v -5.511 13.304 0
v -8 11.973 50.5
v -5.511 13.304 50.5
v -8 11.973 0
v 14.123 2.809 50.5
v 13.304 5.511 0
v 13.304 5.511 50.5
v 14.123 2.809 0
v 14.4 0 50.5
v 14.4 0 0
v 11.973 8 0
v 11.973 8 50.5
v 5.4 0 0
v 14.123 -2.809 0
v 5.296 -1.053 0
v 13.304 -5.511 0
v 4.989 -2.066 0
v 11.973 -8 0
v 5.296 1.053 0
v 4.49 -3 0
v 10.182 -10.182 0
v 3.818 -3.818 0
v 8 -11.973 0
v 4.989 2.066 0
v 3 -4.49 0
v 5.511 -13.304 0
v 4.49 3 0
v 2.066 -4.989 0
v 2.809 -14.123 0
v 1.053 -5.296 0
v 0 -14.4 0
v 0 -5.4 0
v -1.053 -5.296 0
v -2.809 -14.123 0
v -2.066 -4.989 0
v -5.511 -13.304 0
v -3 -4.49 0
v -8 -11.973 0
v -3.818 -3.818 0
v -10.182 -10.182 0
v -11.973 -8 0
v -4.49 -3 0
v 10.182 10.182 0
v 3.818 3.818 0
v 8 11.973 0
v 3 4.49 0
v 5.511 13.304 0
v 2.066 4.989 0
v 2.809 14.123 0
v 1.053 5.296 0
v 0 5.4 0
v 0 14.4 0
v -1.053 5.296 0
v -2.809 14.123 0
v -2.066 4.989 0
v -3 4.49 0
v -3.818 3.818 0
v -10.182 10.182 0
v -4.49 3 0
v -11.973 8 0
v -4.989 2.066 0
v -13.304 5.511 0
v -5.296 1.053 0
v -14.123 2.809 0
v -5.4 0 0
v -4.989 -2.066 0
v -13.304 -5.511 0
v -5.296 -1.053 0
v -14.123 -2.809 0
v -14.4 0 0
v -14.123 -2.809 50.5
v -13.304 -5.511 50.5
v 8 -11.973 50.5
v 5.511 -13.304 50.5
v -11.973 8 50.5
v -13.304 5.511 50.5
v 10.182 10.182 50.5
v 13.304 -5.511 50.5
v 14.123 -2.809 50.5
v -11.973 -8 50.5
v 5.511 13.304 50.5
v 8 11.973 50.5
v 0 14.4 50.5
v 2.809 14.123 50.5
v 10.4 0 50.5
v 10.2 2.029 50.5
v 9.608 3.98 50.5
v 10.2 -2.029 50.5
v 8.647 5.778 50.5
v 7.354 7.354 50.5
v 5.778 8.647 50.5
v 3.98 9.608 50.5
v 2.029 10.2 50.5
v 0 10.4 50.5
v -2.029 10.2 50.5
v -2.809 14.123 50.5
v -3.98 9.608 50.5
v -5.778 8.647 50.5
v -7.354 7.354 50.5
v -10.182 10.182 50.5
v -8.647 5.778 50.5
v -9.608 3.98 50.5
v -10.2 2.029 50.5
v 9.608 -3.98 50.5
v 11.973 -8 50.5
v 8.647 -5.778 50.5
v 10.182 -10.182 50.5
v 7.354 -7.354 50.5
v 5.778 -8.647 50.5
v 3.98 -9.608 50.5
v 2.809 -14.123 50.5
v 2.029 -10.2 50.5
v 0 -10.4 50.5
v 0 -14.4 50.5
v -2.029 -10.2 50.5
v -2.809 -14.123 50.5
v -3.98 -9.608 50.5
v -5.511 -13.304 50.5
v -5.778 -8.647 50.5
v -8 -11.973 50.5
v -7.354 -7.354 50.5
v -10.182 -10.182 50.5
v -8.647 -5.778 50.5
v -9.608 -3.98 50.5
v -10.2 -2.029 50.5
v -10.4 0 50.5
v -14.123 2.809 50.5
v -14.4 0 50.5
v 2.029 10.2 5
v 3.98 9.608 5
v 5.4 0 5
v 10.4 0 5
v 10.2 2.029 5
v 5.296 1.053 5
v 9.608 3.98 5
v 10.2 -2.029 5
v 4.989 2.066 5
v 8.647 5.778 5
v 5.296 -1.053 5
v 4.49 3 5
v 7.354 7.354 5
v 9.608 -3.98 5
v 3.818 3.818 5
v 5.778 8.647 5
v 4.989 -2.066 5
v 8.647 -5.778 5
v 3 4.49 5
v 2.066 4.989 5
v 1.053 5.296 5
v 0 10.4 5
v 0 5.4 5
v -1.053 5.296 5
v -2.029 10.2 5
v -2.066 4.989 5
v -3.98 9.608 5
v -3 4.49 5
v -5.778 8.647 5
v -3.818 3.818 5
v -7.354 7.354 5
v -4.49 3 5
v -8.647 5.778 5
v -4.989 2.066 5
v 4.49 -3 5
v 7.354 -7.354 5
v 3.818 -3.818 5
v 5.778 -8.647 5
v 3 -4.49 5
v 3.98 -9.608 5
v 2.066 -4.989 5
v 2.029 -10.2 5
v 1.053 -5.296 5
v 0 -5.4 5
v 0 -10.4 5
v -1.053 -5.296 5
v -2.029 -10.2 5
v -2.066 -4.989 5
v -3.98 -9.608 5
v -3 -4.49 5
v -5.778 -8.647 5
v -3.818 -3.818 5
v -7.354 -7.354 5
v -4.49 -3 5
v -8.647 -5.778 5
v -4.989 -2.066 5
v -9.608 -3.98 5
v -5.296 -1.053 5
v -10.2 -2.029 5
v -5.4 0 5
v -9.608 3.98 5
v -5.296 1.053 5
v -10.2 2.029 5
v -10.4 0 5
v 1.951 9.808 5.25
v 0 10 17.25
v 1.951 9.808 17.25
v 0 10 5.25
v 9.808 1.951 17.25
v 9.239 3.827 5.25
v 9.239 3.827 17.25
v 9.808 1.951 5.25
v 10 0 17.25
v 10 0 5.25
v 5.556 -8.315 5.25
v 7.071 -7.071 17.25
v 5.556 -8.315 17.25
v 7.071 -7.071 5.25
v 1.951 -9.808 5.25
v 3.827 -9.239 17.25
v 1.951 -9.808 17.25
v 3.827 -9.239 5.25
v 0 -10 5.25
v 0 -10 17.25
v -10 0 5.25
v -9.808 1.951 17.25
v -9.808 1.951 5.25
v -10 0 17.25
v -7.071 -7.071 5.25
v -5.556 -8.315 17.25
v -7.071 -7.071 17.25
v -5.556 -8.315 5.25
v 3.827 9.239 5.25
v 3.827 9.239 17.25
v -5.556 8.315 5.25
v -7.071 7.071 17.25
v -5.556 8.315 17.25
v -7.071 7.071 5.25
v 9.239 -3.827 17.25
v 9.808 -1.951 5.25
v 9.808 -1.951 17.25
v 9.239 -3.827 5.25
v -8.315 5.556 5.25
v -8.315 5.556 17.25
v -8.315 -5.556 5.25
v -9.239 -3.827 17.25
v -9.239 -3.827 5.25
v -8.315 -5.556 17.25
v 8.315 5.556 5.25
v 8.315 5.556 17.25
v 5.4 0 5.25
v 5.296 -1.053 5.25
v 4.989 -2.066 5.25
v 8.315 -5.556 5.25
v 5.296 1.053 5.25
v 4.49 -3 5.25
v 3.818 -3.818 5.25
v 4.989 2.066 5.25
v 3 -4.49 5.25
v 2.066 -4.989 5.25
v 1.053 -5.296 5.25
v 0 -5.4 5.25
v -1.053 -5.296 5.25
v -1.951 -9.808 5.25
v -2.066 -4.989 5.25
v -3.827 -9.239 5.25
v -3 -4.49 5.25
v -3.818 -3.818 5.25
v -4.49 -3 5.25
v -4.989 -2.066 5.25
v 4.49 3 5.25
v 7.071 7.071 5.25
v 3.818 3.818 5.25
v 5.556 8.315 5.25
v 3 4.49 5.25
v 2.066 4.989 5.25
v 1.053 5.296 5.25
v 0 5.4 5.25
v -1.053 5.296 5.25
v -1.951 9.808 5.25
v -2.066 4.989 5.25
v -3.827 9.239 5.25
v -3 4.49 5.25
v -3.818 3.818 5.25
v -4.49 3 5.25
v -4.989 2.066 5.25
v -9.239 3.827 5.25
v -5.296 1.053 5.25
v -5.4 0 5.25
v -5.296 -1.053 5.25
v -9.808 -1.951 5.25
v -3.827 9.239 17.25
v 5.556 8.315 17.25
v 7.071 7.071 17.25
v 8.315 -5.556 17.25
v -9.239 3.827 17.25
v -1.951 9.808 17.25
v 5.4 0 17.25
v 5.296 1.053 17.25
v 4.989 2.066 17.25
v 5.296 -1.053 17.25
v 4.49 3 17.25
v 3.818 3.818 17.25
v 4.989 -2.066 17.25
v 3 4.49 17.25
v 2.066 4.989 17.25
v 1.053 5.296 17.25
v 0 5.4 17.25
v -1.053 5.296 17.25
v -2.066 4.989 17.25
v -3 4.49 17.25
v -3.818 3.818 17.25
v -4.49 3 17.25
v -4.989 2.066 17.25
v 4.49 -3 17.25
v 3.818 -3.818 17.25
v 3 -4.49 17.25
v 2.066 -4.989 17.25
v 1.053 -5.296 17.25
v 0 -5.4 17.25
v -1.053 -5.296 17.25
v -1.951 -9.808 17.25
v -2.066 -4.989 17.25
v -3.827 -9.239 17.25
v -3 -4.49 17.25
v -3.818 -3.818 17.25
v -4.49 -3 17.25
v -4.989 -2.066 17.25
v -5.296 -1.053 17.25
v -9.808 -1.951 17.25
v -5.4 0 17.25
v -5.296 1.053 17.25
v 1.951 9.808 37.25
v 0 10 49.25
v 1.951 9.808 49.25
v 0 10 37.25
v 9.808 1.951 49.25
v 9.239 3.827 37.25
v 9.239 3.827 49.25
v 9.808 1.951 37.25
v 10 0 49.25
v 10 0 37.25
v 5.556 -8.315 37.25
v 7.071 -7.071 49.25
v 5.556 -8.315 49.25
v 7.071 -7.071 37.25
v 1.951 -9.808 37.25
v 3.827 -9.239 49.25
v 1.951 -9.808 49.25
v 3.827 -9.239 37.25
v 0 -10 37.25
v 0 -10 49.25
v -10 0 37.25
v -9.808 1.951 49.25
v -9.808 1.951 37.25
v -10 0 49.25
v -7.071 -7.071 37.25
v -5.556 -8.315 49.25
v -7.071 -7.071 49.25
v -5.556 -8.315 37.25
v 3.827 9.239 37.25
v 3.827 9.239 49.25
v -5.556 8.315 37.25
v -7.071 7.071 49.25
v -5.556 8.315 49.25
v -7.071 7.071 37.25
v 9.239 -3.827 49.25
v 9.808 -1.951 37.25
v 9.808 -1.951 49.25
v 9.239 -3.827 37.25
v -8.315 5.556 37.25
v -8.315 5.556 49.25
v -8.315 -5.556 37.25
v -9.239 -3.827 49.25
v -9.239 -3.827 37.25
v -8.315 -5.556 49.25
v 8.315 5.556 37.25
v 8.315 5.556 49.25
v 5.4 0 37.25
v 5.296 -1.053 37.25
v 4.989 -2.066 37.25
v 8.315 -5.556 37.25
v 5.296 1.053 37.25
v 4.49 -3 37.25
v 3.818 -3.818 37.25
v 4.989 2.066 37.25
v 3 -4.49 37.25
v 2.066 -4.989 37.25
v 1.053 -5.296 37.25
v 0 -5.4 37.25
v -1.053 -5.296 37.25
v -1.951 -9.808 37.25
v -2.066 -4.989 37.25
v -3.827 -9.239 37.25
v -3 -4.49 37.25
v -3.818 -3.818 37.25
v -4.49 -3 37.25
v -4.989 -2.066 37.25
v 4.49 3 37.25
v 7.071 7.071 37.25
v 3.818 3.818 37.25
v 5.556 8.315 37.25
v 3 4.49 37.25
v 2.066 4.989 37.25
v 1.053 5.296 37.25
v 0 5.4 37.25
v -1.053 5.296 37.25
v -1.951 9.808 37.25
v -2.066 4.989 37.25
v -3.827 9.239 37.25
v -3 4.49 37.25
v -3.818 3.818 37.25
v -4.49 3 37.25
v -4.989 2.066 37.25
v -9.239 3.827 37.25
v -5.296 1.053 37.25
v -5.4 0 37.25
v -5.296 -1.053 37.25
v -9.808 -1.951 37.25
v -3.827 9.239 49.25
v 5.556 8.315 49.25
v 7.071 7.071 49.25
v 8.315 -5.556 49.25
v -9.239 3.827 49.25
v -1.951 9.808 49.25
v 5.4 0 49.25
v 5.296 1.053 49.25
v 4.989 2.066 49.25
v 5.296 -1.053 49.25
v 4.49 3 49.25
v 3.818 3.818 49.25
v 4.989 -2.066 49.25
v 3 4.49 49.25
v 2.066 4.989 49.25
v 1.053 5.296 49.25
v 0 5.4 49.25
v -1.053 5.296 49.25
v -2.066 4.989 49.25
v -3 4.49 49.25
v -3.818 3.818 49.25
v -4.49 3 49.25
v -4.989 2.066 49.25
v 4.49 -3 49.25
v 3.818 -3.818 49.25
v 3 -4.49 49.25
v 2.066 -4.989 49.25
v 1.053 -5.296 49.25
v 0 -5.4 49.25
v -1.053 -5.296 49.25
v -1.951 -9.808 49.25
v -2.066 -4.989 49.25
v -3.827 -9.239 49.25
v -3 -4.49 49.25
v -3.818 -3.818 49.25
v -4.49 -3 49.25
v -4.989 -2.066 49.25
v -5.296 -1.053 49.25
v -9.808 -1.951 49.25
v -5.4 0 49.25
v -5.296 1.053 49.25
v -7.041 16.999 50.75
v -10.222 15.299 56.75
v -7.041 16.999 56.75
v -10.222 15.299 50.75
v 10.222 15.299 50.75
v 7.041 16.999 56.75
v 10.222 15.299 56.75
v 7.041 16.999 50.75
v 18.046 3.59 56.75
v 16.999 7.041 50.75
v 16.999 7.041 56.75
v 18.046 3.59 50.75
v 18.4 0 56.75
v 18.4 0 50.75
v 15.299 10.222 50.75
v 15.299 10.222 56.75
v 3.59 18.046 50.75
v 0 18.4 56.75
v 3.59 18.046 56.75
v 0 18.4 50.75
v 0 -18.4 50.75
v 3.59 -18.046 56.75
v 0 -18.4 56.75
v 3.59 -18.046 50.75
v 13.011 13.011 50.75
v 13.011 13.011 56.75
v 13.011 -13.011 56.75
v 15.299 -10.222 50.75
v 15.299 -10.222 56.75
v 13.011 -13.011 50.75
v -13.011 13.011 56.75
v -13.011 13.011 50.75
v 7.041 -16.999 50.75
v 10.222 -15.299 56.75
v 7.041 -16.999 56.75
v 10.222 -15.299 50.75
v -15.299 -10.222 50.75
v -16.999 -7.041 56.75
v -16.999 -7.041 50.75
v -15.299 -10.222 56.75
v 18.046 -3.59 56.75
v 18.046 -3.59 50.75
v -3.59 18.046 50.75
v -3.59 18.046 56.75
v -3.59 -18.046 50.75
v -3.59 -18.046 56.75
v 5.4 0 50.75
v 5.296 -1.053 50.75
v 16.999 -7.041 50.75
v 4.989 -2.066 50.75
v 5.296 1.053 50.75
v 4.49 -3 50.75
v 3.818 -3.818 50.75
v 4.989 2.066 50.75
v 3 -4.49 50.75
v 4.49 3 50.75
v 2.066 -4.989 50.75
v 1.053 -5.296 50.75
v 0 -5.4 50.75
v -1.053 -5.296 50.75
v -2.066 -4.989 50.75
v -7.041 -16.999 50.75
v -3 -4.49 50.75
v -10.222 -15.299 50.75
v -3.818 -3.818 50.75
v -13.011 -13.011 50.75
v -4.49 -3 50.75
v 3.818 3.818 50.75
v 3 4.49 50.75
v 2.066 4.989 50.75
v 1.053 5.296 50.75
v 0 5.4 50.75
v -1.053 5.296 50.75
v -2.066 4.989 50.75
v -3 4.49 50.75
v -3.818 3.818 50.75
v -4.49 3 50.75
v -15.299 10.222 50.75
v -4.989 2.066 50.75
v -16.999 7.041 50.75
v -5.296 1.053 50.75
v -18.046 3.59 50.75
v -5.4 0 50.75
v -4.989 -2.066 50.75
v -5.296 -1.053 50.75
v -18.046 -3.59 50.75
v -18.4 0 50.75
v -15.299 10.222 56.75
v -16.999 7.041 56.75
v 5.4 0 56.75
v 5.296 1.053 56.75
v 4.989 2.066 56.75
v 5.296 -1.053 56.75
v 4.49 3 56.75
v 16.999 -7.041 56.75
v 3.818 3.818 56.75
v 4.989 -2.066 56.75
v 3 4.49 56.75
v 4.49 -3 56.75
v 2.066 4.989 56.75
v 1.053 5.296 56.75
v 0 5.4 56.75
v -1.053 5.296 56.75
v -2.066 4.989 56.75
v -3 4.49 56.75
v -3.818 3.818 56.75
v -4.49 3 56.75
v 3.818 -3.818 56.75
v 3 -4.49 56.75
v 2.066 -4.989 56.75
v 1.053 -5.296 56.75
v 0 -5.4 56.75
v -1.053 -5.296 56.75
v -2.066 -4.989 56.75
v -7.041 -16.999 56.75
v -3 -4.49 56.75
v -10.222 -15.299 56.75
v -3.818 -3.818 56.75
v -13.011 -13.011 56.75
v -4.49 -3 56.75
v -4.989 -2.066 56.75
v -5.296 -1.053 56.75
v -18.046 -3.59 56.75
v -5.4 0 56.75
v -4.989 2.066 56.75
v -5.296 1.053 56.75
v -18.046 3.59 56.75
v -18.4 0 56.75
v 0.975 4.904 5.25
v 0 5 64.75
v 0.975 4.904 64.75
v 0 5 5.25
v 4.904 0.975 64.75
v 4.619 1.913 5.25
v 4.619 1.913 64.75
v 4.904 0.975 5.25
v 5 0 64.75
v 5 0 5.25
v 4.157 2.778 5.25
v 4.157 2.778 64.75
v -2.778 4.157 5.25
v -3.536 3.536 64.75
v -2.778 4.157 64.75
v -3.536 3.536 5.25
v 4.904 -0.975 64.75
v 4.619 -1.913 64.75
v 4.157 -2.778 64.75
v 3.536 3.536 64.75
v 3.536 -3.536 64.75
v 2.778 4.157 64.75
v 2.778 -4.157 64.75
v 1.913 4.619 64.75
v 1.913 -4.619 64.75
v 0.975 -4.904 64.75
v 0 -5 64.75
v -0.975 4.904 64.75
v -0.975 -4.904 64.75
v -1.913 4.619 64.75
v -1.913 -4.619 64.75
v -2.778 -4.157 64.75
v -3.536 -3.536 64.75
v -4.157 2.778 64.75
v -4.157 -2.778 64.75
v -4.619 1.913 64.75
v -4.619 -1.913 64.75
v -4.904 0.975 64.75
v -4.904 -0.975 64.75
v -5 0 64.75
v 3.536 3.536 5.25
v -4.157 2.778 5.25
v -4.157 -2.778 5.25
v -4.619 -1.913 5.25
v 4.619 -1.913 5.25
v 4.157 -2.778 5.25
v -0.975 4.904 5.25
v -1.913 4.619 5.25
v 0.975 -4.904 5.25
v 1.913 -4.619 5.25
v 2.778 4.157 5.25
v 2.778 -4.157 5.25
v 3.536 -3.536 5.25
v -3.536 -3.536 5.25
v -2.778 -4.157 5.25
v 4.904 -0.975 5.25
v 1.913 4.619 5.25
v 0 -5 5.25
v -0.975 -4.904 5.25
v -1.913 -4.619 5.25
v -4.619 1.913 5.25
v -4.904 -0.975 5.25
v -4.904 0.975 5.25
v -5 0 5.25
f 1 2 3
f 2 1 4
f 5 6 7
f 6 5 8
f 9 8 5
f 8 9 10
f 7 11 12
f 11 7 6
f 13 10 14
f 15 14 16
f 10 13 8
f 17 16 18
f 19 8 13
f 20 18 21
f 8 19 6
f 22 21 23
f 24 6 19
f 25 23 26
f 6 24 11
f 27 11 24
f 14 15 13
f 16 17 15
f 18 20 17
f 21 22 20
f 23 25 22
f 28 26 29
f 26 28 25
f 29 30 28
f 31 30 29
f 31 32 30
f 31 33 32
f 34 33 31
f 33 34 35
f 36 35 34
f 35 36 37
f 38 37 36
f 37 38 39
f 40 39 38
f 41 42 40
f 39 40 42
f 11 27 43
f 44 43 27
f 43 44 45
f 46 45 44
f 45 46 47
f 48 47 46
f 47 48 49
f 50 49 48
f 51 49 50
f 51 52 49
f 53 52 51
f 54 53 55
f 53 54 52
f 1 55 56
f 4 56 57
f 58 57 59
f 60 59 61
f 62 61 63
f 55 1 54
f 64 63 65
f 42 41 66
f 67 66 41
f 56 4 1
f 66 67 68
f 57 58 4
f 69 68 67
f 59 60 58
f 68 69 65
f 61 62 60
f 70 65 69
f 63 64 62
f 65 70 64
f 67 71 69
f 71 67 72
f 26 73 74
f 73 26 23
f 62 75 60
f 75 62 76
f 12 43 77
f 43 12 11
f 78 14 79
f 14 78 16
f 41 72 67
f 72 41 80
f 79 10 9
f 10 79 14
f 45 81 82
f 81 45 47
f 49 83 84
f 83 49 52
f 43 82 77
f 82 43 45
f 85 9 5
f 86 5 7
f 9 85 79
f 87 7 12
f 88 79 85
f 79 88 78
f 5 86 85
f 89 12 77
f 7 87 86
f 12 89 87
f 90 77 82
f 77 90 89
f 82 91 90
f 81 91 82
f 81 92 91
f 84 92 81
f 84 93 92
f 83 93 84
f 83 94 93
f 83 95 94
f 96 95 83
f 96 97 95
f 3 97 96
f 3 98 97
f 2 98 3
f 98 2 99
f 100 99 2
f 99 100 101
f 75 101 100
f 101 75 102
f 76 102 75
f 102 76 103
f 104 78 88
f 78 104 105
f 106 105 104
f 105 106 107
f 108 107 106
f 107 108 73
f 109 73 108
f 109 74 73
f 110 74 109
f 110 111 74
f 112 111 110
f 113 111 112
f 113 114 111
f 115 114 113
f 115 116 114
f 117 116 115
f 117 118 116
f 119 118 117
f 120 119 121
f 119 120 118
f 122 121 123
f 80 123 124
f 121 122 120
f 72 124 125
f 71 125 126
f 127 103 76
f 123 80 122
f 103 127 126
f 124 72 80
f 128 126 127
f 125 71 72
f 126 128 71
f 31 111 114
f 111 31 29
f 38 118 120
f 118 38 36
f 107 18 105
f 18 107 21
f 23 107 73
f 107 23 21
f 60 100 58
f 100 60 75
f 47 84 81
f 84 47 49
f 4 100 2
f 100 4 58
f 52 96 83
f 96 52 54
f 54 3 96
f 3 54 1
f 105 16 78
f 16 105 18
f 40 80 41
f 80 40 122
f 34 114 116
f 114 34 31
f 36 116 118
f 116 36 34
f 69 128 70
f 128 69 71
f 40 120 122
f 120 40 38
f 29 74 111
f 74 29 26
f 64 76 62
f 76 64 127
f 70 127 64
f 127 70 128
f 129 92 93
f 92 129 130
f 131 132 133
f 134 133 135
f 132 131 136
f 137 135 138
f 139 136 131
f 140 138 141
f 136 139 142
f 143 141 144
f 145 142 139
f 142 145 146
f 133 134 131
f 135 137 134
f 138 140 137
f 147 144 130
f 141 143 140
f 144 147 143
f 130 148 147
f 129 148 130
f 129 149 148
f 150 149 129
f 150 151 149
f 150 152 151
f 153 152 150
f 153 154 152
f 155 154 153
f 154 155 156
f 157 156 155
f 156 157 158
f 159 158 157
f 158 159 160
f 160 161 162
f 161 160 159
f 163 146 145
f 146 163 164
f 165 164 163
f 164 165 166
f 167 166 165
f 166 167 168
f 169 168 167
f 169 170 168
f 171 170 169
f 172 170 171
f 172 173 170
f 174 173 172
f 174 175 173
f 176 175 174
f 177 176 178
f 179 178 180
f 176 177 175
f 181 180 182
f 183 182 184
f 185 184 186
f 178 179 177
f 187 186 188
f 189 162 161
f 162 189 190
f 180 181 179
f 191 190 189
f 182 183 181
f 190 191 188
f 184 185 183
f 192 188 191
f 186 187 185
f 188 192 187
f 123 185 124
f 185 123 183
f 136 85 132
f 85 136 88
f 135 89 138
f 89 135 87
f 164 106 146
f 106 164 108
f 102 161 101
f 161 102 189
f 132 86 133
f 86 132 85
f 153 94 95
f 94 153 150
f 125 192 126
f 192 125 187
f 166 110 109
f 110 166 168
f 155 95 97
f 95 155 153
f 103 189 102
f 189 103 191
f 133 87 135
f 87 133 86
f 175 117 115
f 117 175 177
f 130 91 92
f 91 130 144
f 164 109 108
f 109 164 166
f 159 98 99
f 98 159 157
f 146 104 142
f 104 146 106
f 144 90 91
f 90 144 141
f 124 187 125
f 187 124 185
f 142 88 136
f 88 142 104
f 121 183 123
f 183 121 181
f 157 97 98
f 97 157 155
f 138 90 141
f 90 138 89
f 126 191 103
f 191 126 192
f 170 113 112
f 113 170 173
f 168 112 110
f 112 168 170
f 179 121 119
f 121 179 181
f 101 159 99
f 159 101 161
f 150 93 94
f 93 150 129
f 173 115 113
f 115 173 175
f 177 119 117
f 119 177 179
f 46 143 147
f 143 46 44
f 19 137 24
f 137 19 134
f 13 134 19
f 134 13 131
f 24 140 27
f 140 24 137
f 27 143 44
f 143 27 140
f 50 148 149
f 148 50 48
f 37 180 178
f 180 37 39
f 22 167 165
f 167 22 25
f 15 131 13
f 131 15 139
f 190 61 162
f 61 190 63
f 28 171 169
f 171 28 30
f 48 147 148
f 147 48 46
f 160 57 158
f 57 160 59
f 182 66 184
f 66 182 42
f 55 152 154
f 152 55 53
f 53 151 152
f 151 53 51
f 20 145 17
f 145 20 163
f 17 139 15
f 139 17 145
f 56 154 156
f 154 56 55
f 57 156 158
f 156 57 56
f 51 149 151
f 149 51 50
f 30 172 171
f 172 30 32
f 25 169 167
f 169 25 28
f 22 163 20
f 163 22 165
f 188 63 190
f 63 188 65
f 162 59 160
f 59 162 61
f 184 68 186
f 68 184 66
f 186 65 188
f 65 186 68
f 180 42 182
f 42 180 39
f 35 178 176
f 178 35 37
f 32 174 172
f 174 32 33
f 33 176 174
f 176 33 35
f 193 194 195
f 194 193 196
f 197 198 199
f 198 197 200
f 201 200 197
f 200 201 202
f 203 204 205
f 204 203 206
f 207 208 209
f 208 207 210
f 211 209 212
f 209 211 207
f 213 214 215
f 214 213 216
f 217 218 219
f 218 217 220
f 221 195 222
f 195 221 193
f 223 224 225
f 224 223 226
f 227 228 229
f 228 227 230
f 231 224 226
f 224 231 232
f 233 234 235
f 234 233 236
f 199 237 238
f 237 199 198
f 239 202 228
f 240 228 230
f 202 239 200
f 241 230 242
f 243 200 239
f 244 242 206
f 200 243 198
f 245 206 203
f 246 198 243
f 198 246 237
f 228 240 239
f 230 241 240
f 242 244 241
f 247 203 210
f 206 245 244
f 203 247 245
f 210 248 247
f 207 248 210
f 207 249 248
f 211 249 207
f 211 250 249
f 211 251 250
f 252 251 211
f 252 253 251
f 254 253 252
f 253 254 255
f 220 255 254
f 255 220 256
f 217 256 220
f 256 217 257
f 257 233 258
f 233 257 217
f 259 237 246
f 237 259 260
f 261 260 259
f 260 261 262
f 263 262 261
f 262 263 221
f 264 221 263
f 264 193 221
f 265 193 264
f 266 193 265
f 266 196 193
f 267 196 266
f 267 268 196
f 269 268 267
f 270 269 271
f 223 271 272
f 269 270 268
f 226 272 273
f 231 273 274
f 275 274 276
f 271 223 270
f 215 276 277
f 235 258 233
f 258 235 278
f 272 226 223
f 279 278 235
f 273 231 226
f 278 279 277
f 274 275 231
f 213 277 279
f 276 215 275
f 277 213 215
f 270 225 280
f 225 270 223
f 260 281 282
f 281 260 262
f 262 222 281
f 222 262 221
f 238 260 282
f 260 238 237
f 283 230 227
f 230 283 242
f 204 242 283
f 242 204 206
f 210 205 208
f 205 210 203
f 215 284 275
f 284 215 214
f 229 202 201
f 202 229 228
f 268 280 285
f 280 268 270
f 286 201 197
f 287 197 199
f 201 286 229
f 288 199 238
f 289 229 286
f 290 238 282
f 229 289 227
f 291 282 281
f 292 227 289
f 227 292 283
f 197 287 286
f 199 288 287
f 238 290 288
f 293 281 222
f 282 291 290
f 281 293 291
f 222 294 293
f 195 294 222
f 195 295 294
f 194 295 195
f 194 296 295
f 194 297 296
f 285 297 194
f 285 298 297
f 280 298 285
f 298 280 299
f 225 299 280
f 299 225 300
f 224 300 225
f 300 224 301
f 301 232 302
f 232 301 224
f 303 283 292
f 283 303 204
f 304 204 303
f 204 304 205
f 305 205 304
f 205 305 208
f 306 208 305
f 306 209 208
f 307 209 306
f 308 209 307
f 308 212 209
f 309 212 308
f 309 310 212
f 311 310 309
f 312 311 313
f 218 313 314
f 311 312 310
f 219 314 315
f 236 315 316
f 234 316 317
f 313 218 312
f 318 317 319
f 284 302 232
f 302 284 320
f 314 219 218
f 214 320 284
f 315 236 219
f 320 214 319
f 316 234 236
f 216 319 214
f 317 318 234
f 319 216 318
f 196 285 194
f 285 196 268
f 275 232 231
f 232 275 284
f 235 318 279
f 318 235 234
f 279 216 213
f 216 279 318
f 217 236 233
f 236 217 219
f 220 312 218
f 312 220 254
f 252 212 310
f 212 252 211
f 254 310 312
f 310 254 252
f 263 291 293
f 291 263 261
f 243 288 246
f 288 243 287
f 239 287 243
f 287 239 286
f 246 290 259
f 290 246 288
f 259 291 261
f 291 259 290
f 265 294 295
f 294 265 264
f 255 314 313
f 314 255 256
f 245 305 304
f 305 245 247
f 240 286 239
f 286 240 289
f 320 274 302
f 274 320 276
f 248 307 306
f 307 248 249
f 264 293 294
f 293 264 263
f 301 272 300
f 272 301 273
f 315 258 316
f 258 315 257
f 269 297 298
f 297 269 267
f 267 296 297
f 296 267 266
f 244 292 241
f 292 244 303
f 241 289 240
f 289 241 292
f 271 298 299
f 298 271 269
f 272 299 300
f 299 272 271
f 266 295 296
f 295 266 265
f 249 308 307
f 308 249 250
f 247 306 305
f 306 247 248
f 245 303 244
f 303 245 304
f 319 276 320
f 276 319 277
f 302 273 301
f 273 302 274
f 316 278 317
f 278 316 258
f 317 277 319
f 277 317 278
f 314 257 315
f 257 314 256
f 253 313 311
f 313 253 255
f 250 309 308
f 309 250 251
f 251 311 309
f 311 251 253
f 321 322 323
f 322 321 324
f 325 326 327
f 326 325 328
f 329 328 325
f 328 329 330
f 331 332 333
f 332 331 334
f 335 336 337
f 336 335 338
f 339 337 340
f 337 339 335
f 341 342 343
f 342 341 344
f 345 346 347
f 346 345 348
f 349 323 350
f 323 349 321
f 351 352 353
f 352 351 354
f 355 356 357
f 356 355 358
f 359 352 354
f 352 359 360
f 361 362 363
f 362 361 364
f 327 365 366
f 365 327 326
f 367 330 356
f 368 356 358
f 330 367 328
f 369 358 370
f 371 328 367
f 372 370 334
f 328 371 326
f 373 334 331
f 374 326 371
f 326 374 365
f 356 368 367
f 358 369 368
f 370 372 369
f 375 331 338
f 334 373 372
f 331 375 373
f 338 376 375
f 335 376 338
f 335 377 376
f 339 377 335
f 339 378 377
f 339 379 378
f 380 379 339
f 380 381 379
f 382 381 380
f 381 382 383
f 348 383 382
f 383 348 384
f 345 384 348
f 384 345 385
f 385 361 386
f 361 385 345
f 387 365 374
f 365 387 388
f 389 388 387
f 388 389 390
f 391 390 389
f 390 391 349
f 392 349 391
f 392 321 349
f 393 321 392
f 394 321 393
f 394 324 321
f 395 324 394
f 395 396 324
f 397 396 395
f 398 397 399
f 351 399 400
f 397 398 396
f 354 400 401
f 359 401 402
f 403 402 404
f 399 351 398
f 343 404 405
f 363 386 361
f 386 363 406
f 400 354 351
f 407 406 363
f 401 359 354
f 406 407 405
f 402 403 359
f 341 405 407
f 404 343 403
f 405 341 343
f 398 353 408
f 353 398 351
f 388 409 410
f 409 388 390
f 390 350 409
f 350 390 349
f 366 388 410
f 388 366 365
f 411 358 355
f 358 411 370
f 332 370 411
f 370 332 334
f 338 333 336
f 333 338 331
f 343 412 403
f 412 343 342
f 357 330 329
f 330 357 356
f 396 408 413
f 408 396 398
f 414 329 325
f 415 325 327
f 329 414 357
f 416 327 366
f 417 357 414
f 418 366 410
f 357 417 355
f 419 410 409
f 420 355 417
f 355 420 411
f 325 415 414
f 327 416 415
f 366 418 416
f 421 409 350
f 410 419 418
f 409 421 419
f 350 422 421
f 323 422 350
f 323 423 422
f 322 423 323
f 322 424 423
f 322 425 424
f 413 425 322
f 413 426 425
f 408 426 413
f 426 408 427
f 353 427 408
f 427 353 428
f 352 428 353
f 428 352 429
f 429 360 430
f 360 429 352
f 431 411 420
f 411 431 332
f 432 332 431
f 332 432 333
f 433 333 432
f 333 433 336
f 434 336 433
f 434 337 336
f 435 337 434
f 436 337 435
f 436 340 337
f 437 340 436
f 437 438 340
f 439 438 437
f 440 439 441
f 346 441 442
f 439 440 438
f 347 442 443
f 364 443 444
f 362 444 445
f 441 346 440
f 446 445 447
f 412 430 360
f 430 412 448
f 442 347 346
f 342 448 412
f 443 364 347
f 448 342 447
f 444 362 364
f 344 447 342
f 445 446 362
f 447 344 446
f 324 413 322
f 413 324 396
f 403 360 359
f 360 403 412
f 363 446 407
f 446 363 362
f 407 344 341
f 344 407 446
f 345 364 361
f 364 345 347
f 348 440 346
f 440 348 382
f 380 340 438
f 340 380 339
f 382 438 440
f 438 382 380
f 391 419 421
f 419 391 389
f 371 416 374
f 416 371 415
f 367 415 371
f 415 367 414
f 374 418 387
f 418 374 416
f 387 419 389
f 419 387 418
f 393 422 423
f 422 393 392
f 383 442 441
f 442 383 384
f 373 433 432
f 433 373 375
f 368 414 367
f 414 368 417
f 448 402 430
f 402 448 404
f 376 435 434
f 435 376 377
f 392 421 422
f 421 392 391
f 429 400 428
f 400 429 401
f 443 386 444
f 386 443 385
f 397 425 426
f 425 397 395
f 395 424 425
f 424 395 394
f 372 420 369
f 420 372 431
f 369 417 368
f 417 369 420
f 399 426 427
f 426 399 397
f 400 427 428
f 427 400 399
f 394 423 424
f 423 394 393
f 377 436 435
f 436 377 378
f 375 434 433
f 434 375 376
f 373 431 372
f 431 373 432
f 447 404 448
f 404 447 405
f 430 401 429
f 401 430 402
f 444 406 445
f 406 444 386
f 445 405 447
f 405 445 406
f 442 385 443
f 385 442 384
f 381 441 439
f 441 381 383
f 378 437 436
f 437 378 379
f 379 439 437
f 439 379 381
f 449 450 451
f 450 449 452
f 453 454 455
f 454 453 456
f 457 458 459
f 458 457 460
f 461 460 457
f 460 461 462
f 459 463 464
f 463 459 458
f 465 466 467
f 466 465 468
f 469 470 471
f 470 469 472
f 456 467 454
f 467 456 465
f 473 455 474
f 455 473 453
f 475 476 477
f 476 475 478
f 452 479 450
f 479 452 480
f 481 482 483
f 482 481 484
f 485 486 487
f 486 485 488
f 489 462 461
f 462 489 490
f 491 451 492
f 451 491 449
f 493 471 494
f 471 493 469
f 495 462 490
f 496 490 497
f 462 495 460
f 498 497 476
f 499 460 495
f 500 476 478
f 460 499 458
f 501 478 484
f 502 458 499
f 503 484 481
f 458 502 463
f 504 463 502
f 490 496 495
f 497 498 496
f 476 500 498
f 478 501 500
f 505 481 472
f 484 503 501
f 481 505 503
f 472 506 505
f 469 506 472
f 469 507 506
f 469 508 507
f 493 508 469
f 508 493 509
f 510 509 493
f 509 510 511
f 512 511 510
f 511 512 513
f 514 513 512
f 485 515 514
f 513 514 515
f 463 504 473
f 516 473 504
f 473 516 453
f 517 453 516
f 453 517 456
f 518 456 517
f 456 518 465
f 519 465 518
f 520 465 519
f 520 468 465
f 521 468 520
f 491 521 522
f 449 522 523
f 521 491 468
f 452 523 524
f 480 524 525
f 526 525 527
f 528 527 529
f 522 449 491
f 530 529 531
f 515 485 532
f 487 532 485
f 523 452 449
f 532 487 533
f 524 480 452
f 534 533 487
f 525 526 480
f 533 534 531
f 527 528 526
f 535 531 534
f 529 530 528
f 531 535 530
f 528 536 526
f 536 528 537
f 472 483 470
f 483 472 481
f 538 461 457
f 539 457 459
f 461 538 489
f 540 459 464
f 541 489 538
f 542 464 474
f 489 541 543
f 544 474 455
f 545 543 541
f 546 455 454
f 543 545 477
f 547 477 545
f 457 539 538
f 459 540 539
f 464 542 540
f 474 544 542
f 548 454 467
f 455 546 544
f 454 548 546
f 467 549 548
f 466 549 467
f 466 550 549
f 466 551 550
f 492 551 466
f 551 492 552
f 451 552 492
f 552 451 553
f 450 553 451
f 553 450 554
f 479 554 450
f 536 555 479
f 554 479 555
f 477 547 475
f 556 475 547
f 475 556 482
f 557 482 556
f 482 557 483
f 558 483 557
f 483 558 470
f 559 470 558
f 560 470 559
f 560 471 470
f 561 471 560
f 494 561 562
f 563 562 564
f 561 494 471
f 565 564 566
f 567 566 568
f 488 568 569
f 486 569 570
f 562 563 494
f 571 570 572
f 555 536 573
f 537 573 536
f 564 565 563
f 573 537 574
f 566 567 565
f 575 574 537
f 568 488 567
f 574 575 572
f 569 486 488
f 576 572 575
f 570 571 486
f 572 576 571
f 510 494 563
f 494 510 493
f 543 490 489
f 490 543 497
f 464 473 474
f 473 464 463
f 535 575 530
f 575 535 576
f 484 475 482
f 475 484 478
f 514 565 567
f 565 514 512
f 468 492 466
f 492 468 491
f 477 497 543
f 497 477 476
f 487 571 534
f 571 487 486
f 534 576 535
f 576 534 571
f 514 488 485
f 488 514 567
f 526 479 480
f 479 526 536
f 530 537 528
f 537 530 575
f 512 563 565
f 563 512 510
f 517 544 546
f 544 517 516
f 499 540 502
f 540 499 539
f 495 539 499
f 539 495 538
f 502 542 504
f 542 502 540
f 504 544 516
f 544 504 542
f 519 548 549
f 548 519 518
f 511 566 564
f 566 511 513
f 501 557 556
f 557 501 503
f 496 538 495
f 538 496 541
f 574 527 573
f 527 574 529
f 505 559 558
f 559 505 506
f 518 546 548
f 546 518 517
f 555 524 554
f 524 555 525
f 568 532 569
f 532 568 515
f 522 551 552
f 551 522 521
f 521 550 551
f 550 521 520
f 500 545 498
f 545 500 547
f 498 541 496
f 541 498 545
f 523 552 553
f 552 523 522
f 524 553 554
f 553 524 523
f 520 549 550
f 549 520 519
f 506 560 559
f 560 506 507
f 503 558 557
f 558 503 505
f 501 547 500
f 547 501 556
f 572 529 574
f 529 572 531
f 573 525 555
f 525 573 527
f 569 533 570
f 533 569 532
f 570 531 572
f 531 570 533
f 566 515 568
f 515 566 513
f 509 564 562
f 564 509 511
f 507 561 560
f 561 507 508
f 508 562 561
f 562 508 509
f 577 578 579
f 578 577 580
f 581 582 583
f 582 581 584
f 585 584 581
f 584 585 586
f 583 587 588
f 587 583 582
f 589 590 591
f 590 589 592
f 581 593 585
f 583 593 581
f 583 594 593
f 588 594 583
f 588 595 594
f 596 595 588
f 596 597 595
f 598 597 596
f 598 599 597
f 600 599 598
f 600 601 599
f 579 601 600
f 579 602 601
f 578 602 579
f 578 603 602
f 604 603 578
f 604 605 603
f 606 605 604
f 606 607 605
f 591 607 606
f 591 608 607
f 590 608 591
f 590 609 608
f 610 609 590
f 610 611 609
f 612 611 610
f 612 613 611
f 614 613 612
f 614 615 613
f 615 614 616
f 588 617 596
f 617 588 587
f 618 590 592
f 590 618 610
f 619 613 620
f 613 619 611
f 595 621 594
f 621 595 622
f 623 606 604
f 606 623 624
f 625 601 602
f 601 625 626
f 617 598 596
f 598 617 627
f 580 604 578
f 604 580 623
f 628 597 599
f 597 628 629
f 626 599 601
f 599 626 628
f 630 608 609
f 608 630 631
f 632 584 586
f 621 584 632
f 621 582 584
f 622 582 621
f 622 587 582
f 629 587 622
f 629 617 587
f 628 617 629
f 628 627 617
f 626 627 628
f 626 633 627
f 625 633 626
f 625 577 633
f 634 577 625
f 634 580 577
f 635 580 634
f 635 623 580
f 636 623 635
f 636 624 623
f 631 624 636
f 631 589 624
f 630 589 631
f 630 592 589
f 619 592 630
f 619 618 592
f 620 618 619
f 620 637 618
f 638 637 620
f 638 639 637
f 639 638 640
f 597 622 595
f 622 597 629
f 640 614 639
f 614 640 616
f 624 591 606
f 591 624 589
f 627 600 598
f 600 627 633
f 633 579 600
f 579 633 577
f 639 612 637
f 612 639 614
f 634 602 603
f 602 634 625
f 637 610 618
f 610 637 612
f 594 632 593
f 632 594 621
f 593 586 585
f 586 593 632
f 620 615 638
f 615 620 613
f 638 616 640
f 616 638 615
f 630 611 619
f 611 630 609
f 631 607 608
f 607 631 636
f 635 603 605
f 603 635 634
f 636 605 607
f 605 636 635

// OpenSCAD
$fn = 32;

// ------------------------------------------------------------------------
// Shaft station: cup d28.8 x 50.5 mm, shaft d10
// Every part is its own module, assembly() places every instance.
// ------------------------------------------------------------------------

// --- part 1 ---
module housing_cup() {
  difference() {
    cylinder(h = 50.5, d = 28.8);
    translate([0, 0, 5]) cylinder(h = 46.5, d = 20.8);
    translate([0, 0, -1]) cylinder(h = 7, d = 10.8);
  }
}

// --- part 2 ---
module bearing_lower() {
  difference() {
      translate([0, 0, 0]) cylinder(h = 12, d = 20);
      translate([0, 0, -1]) cylinder(h = 14, d = 10.8);
    }
}

// --- part 3 ---
module bearing_upper() {
  difference() {
      translate([0, 0, 0]) cylinder(h = 12, d = 20);
      translate([0, 0, -1]) cylinder(h = 14, d = 10.8);
    }
}

// --- part 4 ---
module station_shaft() {
  translate([0, 0, -29.75]) cylinder(h = 59.5, d = 10);
}

// --- part 5 ---
module station_cover() {
  difference() {
    cylinder(h = 6, d = 36.8);
    translate([0, 0, -1]) cylinder(h = 8, d = 10.8);
  }
}

// --- assembly ---
module assembly() {
  color([0.80, 0.24, 0.20]) translate([0, 0, 0]) rotate([0, 0, 0]) housing_cup();
  color([0.20, 0.45, 0.75]) translate([0, 0, 5.25]) rotate([0, 0, 0]) bearing_lower();
  color([0.25, 0.62, 0.32]) translate([0, 0, 37.25]) rotate([0, 0, 0]) bearing_upper();
  color([0.92, 0.70, 0.18]) translate([0, 0, 35]) rotate([0, 0, 0]) station_shaft();
  color([0.58, 0.35, 0.70]) translate([0, 0, 50.75]) rotate([0, 0, 0]) station_cover();
}

assembly();
